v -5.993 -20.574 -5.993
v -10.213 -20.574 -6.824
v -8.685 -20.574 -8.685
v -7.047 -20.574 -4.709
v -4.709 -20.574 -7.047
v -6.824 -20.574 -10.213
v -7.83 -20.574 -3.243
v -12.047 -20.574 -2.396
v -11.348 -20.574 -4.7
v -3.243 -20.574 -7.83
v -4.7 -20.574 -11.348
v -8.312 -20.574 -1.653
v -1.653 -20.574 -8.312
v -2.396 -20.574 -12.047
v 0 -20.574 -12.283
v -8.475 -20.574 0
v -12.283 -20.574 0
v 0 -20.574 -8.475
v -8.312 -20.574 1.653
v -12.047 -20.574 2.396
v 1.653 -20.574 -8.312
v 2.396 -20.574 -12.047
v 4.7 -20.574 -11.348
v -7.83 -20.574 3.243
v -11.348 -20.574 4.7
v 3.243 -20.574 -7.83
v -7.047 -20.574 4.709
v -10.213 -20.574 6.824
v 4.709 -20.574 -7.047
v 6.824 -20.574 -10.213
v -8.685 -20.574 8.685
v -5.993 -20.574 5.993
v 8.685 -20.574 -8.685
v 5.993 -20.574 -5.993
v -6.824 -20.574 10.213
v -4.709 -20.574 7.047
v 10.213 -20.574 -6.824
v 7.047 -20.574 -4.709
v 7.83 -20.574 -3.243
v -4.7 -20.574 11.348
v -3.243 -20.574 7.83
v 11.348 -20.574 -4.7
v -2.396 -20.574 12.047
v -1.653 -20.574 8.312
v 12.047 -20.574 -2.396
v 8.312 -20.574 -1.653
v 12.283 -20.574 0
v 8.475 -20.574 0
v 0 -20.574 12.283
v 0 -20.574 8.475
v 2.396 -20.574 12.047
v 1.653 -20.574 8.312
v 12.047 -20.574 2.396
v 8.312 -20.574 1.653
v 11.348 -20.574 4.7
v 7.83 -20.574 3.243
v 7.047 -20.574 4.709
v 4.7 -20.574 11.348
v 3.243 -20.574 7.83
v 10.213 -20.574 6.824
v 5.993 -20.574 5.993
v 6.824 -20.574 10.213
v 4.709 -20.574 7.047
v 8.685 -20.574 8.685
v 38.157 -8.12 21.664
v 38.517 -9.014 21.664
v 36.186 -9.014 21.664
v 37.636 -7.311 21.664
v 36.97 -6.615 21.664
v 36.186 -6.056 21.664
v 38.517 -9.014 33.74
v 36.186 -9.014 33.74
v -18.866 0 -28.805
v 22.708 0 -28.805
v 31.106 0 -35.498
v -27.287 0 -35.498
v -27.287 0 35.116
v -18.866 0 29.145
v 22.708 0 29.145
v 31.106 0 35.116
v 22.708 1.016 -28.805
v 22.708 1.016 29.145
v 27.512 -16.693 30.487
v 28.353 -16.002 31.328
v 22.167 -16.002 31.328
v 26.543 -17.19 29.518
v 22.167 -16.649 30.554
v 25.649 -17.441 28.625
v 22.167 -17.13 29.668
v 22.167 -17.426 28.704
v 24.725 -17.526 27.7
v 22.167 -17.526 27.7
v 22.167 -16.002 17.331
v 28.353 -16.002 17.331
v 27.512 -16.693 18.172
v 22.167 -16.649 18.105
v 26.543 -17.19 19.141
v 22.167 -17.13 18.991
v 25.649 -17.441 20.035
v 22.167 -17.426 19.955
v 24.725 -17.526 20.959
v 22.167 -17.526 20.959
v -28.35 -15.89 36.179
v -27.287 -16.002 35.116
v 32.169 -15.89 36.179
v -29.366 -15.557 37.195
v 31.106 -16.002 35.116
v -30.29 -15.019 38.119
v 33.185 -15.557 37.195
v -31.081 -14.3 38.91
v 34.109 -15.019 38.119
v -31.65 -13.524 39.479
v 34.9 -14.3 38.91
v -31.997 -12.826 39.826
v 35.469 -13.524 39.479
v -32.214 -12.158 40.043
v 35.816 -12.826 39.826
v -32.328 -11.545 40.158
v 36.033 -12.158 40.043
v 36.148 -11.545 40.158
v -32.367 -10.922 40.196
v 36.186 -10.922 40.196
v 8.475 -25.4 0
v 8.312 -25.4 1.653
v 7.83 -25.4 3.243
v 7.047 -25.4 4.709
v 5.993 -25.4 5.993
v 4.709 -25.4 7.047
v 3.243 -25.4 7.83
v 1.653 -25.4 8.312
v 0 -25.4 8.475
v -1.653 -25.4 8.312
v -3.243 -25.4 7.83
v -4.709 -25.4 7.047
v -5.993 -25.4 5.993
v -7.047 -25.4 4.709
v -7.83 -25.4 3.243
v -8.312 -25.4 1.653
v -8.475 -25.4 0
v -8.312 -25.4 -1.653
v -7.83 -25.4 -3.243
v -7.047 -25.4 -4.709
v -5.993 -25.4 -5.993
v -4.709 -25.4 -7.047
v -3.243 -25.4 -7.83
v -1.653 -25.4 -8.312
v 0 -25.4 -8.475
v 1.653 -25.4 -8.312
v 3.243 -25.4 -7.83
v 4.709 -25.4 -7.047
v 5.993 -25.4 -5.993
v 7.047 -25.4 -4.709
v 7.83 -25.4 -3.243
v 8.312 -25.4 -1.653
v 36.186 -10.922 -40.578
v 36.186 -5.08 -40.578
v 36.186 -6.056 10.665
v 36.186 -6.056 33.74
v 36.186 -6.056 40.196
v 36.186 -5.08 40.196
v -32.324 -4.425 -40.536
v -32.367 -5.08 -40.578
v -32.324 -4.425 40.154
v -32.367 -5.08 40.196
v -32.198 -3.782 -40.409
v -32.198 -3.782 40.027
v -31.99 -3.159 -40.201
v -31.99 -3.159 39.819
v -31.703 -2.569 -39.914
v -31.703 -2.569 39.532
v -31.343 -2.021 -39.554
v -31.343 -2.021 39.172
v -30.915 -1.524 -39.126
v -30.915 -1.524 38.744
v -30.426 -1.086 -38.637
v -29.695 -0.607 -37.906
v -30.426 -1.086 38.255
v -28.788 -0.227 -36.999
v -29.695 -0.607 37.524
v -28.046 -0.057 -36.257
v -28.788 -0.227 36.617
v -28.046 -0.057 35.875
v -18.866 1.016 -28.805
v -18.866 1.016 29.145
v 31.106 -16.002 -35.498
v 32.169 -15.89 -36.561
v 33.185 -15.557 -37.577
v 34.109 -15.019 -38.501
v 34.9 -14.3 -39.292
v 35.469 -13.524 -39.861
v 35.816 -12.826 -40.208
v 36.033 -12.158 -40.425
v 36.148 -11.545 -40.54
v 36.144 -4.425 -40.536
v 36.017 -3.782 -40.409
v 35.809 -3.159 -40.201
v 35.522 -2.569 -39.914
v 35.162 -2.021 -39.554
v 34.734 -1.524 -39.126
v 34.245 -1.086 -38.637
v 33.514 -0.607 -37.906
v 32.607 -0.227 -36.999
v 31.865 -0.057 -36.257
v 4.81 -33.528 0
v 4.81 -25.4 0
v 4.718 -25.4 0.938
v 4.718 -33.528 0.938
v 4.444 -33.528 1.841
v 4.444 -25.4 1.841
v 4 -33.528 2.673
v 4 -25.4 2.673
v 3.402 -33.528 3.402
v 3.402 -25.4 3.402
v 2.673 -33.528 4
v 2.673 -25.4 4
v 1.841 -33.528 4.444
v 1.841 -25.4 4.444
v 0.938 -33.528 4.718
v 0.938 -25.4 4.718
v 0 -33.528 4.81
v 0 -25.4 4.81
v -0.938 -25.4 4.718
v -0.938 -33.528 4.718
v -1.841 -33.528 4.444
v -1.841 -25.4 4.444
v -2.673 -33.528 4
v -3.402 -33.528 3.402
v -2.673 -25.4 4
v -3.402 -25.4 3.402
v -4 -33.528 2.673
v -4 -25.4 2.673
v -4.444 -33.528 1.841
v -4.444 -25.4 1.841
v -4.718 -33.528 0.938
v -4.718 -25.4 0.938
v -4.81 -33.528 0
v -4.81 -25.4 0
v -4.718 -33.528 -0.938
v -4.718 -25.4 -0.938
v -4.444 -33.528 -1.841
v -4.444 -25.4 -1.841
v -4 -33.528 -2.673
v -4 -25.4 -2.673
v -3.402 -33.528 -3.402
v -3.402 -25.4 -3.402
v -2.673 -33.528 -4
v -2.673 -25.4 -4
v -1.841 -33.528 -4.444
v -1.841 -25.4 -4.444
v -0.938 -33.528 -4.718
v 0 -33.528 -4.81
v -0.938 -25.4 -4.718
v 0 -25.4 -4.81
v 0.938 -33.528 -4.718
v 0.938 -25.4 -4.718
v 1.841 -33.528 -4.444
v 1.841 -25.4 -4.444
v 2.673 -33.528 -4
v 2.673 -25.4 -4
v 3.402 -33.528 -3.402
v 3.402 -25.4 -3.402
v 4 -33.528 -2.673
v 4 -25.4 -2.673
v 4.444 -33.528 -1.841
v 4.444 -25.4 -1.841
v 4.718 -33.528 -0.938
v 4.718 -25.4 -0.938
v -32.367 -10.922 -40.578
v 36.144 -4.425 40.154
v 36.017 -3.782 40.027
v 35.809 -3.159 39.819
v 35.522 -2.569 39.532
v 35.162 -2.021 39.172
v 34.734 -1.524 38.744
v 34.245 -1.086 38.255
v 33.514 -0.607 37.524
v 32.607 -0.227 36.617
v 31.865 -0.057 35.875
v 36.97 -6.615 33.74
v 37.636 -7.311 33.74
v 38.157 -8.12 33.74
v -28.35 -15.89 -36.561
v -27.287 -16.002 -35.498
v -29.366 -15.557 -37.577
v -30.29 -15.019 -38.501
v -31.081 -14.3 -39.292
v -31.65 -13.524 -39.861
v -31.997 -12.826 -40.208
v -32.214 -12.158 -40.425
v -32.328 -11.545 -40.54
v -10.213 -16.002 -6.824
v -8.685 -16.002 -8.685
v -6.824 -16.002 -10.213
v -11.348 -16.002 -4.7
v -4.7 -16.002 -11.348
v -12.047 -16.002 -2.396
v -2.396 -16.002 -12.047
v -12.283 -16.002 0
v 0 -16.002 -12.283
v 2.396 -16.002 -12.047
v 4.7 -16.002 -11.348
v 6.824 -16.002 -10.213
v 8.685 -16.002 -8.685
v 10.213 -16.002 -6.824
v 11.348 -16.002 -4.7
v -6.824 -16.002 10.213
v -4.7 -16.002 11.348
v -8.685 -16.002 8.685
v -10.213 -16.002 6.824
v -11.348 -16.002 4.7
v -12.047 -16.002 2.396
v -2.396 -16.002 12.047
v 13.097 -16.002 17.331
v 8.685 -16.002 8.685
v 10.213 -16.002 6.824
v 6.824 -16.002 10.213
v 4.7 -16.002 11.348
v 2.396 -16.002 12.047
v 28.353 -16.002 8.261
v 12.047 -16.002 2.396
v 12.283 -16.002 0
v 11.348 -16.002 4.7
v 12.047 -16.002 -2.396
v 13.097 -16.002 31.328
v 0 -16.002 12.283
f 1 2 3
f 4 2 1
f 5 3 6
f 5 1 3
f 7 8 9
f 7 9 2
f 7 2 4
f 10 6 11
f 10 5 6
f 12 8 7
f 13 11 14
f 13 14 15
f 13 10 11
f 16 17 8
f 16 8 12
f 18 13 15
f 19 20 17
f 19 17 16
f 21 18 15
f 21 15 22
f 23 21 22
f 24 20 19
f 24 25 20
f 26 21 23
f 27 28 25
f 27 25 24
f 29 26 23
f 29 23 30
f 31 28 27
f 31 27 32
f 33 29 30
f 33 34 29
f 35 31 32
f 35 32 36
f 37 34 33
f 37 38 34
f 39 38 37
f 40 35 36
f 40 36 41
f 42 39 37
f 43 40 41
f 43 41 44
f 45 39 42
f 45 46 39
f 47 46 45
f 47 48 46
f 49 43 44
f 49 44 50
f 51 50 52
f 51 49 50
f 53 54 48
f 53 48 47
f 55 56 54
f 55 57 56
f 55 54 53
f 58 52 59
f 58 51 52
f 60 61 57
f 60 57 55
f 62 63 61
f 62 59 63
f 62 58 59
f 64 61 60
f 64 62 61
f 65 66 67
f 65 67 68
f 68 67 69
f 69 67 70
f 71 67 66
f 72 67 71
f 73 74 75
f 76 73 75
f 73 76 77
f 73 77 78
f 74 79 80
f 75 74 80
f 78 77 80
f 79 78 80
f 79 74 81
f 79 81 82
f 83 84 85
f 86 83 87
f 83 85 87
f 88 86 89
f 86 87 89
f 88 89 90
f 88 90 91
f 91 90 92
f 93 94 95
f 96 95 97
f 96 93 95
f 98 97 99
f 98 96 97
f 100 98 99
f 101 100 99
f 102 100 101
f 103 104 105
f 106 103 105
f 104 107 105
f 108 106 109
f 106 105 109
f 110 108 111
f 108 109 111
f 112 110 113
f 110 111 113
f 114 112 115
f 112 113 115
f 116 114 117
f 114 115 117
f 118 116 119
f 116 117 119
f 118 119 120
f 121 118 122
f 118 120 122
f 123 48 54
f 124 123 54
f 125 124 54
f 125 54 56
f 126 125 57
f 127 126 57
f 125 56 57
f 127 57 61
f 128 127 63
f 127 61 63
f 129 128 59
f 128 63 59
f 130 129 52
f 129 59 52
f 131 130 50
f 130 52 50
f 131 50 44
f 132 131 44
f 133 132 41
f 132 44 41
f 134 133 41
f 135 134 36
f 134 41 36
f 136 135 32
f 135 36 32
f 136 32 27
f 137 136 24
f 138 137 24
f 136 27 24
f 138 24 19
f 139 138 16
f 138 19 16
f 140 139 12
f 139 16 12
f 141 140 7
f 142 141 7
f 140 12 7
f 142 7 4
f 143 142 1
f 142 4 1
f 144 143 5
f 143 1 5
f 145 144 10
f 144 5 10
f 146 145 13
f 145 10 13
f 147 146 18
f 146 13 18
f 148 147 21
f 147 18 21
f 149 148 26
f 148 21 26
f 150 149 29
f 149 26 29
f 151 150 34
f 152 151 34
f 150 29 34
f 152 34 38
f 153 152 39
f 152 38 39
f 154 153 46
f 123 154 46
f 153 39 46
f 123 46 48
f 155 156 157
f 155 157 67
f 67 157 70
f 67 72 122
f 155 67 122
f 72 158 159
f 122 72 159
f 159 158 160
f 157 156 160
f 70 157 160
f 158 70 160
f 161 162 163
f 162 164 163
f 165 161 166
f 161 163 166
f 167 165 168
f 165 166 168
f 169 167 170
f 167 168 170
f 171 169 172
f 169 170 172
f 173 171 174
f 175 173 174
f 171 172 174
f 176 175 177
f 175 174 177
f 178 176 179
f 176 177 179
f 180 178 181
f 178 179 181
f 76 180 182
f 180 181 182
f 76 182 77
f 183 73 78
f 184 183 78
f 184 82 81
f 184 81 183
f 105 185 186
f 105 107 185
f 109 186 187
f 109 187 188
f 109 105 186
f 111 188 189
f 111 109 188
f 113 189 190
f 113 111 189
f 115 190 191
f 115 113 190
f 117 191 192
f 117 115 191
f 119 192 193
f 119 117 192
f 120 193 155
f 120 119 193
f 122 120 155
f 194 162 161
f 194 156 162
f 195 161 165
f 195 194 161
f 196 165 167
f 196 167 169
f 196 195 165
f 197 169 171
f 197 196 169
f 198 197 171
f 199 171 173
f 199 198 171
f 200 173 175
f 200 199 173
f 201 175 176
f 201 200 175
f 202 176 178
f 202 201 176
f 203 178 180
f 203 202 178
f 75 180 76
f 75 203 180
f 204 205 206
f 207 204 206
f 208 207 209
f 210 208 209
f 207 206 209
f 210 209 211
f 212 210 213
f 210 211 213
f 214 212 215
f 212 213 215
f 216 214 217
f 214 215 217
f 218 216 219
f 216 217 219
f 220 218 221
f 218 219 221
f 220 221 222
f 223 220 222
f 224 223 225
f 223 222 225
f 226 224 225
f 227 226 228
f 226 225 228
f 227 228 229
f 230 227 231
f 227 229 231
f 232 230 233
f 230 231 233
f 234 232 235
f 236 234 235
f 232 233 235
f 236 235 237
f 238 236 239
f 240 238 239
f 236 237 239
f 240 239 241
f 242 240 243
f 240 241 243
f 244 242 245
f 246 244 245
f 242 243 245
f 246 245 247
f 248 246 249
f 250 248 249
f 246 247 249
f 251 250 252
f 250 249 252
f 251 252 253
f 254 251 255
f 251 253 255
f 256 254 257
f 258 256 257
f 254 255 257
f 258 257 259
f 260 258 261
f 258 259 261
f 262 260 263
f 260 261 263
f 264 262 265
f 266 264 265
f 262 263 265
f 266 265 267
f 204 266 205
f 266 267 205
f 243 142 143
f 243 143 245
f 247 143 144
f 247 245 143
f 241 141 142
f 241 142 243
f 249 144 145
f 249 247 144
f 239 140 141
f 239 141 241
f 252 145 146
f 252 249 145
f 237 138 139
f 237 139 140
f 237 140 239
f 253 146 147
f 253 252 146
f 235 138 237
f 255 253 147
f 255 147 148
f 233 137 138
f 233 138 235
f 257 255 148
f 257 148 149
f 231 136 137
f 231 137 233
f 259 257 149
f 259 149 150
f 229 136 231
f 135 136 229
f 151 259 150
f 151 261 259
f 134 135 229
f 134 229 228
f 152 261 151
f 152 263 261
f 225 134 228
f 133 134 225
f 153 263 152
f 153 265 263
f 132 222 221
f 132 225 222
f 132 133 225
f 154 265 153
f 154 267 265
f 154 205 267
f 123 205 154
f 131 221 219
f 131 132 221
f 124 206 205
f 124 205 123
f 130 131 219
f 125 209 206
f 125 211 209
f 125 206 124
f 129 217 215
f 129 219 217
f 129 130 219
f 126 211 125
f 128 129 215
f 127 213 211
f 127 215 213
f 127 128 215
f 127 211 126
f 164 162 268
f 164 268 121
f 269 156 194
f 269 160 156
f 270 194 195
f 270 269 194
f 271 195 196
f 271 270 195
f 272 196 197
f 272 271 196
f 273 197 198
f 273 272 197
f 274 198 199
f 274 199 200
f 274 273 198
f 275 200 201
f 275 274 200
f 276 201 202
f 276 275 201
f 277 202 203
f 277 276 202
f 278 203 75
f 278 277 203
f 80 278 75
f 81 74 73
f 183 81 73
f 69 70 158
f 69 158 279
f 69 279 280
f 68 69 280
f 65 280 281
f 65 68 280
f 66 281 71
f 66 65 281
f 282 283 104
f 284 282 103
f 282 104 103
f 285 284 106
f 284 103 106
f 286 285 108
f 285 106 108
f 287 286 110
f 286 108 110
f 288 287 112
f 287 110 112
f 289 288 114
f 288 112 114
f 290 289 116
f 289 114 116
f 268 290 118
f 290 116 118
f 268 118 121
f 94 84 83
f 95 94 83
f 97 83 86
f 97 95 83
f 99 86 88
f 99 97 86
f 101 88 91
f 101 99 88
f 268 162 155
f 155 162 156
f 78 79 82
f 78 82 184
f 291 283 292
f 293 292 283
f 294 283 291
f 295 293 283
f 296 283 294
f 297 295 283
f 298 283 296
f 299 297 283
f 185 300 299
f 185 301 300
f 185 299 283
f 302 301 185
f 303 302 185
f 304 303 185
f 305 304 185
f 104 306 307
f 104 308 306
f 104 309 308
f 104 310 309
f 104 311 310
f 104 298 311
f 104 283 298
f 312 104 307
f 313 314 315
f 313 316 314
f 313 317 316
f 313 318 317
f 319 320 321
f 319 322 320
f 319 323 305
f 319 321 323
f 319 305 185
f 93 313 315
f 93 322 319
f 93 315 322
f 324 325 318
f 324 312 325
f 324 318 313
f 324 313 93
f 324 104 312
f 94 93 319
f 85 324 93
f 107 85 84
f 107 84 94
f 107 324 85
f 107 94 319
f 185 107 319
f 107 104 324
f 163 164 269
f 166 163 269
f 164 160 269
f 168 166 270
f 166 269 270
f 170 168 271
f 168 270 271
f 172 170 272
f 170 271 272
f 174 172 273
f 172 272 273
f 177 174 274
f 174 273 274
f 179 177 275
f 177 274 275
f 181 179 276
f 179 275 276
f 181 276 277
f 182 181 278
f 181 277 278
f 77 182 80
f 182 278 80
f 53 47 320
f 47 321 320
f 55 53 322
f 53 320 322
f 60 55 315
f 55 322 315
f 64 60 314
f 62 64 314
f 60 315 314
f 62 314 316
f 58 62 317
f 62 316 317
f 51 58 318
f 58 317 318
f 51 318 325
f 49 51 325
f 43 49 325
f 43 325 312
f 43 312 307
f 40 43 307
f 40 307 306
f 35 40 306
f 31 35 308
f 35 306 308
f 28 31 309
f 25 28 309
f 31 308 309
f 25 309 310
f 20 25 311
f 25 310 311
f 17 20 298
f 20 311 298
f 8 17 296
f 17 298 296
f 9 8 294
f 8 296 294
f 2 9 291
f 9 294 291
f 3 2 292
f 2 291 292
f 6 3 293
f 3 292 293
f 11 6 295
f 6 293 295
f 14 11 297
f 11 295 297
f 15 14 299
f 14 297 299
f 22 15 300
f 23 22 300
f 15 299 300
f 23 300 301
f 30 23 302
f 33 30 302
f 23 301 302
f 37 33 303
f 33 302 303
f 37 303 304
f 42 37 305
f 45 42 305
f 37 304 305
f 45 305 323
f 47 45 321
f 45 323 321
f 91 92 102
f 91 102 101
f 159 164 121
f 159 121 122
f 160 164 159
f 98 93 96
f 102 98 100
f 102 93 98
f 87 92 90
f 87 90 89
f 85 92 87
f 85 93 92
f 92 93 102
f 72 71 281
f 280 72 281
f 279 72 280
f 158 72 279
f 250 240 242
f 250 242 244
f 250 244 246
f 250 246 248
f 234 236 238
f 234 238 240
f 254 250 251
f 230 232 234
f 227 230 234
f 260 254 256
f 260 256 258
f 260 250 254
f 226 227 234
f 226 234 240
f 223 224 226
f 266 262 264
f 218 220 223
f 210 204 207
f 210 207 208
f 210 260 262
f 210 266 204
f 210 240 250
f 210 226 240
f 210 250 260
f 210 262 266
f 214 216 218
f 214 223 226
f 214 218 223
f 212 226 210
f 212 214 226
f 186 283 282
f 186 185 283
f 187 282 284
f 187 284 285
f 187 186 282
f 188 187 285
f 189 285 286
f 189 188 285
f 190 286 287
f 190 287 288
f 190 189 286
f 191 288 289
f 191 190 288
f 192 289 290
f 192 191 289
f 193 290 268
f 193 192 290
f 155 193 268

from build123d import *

# Parameters (mm, degrees)
F0_W         = 68.5527212918
F0_H         = 80.7738155127
F1_DEPTH     = 16.002
F2_R         = 12.2829248395
F2_W         = 6.1860904098
F2_H         = 13.9971412718
F4_DEPTH     = 1.524
F5_DEPTH     = 3.048
F3_W         = 2.9572332278
F3_H         = 12.0760332793
F6_DEPTH     = 2.54
F7_T1_DEPTH  = 34.0730785354
F8_R         = 8.4752207388
F9_DEPTH     = 4.826
F10_R        = 4.8104699567
F11_DEPTH    = 8.128
F12_R        = 5.08
F13_T1_DEPTH = 32.1363694803
F13_T3_DEPTH = 24.3253186183
F14_W        = 41.5736716241
F14_H        = 57.9494982958
F15_DEPTH    = 1.016


# Not quite as in the source:
# - a fillet or chamfer that OpenCascade refuses, or shapes differently, is made with other operations: its cross-section is extruded or revolved along the edge and cut away or added


with BuildPart() as f1:
    # F0 (on Front) → F1 (new body)
    with BuildSketch(Plane.XZ):
        with Locations((1.9095446914, -0.1909546554)):
            Rectangle(F0_W, F0_H)
    extrude(amount=F1_DEPTH)

    # F2 (on face) → F4 (join)
    with BuildSketch(Plane.XZ.offset(16.002)):
        Circle(F2_R)
        with Locations((25.2598635852, 24.3296492845)):
            Rectangle(F2_W, F2_H)
    extrude(amount=F4_DEPTH)

    # F5 (add): a face of the model
    f5_faces = [f1.faces().sort_by_distance(p)[0] for p in [
        (0, -17.526, 0),
    ]]
    extrude(f5_faces, amount=F5_DEPTH)

    # F3 (on face) → F6 (join)
    with BuildSketch(Plane.YZ.offset(36.1859053373)):
        with Locations((-7.535086479, 27.7017401531)):
            Rectangle(F3_W, F3_H)
    extrude(amount=F6_DEPTH)

    # F7: fillet of radius 5.08 on 1 edges, made by hand

    # F7_s2 → F7_t1 (cut)
    with BuildSketch(Plane.XY.offset(10.6652008854)):
        with BuildLine():
            ThreePointArc((36.1859053373, -6.0564698651), (38.0453143886, -7.9158789164), (38.7259053373, -10.4558789164))
            Line((38.7259053373, -10.4558789164), (38.7259053373, -6.0564698651))
            Line((38.7259053373, -6.0564698651), (36.1859053373, -6.0564698651))
        make_face()
    extrude(amount=F7_T1_DEPTH, mode=Mode.SUBTRACT)

    # F8 (on face) → F9 (join)
    with BuildSketch(Plane.XZ.offset(20.574)):
        Circle(F8_R)
    extrude(amount=F9_DEPTH)

    # F10 (on face) → F11 (join)
    with BuildSketch(Plane.XZ.offset(25.4)):
        Circle(F10_R)
    extrude(amount=F11_DEPTH)

    # F12
    f12_edges = [f1.edges().sort_by_distance(p)[0] for p in [
        (36.185905, -16.002, -0.190955),
        (1.909545, -16.002, 40.195953),
        (1.909545, -16.002, -40.577862),
        (-32.366816, -16.002, -0.190955),
        (1.909545, 0, -40.577862),
        (36.185905, 0, -0.190955),
        (1.909545, 0, 40.195953),
        (-32.366816, 0, -0.190955),
    ]]
    fillet(f12_edges, radius=F12_R)

    # F13: fillet of radius 5.08 on 3 edges, made by hand

    # F13_s2 → F13_t1 (cut)
    with BuildSketch(Plane.XY.offset(8.2614645443)):
        with BuildLine():
            ThreePointArc((28.3529087901, -16.002), (26.6925386883, -17.1295285843), (24.7250631484, -17.526))
            Line((24.7250631484, -17.526), (28.3529087901, -17.526))
            Line((28.3529087901, -17.526), (28.3529087901, -16.002))
        make_face()
    extrude(amount=F13_T1_DEPTH, mode=Mode.SUBTRACT)

    # F13_s4 → F13_t3 (cut)
    with BuildSketch(Plane.YZ.offset(13.0972042761)):
        with BuildLine():
            ThreePointArc((-16.002, 31.3282199204), (-17.1295285843, 29.6678498186), (-17.526, 27.7003742787))
            Line((-17.526, 27.7003742787), (-17.526, 31.3282199204))
            Line((-17.526, 31.3282199204), (-16.002, 31.3282199204))
        make_face()
        with BuildLine():
            ThreePointArc((-16.002, 17.3310786486), (-17.1295285843, 18.9914487504), (-17.526, 20.9589242903))
            Line((-17.526, 20.9589242903), (-17.526, 17.3310786486))
            Line((-17.526, 17.3310786486), (-16.002, 17.3310786486))
        make_face()
    extrude(amount=F13_T3_DEPTH, mode=Mode.SUBTRACT)

    # F14 (on face) → F15 (join)
    with BuildSketch(Plane(origin=(0, 0, 0), x_dir=(-1, 0, 0), z_dir=(0, 1, 0))):
        with Locations((-1.9210586324, 0.1702420413)):
            Rectangle(F14_W, F14_H)
    extrude(amount=F15_DEPTH)


solid = f1.part
